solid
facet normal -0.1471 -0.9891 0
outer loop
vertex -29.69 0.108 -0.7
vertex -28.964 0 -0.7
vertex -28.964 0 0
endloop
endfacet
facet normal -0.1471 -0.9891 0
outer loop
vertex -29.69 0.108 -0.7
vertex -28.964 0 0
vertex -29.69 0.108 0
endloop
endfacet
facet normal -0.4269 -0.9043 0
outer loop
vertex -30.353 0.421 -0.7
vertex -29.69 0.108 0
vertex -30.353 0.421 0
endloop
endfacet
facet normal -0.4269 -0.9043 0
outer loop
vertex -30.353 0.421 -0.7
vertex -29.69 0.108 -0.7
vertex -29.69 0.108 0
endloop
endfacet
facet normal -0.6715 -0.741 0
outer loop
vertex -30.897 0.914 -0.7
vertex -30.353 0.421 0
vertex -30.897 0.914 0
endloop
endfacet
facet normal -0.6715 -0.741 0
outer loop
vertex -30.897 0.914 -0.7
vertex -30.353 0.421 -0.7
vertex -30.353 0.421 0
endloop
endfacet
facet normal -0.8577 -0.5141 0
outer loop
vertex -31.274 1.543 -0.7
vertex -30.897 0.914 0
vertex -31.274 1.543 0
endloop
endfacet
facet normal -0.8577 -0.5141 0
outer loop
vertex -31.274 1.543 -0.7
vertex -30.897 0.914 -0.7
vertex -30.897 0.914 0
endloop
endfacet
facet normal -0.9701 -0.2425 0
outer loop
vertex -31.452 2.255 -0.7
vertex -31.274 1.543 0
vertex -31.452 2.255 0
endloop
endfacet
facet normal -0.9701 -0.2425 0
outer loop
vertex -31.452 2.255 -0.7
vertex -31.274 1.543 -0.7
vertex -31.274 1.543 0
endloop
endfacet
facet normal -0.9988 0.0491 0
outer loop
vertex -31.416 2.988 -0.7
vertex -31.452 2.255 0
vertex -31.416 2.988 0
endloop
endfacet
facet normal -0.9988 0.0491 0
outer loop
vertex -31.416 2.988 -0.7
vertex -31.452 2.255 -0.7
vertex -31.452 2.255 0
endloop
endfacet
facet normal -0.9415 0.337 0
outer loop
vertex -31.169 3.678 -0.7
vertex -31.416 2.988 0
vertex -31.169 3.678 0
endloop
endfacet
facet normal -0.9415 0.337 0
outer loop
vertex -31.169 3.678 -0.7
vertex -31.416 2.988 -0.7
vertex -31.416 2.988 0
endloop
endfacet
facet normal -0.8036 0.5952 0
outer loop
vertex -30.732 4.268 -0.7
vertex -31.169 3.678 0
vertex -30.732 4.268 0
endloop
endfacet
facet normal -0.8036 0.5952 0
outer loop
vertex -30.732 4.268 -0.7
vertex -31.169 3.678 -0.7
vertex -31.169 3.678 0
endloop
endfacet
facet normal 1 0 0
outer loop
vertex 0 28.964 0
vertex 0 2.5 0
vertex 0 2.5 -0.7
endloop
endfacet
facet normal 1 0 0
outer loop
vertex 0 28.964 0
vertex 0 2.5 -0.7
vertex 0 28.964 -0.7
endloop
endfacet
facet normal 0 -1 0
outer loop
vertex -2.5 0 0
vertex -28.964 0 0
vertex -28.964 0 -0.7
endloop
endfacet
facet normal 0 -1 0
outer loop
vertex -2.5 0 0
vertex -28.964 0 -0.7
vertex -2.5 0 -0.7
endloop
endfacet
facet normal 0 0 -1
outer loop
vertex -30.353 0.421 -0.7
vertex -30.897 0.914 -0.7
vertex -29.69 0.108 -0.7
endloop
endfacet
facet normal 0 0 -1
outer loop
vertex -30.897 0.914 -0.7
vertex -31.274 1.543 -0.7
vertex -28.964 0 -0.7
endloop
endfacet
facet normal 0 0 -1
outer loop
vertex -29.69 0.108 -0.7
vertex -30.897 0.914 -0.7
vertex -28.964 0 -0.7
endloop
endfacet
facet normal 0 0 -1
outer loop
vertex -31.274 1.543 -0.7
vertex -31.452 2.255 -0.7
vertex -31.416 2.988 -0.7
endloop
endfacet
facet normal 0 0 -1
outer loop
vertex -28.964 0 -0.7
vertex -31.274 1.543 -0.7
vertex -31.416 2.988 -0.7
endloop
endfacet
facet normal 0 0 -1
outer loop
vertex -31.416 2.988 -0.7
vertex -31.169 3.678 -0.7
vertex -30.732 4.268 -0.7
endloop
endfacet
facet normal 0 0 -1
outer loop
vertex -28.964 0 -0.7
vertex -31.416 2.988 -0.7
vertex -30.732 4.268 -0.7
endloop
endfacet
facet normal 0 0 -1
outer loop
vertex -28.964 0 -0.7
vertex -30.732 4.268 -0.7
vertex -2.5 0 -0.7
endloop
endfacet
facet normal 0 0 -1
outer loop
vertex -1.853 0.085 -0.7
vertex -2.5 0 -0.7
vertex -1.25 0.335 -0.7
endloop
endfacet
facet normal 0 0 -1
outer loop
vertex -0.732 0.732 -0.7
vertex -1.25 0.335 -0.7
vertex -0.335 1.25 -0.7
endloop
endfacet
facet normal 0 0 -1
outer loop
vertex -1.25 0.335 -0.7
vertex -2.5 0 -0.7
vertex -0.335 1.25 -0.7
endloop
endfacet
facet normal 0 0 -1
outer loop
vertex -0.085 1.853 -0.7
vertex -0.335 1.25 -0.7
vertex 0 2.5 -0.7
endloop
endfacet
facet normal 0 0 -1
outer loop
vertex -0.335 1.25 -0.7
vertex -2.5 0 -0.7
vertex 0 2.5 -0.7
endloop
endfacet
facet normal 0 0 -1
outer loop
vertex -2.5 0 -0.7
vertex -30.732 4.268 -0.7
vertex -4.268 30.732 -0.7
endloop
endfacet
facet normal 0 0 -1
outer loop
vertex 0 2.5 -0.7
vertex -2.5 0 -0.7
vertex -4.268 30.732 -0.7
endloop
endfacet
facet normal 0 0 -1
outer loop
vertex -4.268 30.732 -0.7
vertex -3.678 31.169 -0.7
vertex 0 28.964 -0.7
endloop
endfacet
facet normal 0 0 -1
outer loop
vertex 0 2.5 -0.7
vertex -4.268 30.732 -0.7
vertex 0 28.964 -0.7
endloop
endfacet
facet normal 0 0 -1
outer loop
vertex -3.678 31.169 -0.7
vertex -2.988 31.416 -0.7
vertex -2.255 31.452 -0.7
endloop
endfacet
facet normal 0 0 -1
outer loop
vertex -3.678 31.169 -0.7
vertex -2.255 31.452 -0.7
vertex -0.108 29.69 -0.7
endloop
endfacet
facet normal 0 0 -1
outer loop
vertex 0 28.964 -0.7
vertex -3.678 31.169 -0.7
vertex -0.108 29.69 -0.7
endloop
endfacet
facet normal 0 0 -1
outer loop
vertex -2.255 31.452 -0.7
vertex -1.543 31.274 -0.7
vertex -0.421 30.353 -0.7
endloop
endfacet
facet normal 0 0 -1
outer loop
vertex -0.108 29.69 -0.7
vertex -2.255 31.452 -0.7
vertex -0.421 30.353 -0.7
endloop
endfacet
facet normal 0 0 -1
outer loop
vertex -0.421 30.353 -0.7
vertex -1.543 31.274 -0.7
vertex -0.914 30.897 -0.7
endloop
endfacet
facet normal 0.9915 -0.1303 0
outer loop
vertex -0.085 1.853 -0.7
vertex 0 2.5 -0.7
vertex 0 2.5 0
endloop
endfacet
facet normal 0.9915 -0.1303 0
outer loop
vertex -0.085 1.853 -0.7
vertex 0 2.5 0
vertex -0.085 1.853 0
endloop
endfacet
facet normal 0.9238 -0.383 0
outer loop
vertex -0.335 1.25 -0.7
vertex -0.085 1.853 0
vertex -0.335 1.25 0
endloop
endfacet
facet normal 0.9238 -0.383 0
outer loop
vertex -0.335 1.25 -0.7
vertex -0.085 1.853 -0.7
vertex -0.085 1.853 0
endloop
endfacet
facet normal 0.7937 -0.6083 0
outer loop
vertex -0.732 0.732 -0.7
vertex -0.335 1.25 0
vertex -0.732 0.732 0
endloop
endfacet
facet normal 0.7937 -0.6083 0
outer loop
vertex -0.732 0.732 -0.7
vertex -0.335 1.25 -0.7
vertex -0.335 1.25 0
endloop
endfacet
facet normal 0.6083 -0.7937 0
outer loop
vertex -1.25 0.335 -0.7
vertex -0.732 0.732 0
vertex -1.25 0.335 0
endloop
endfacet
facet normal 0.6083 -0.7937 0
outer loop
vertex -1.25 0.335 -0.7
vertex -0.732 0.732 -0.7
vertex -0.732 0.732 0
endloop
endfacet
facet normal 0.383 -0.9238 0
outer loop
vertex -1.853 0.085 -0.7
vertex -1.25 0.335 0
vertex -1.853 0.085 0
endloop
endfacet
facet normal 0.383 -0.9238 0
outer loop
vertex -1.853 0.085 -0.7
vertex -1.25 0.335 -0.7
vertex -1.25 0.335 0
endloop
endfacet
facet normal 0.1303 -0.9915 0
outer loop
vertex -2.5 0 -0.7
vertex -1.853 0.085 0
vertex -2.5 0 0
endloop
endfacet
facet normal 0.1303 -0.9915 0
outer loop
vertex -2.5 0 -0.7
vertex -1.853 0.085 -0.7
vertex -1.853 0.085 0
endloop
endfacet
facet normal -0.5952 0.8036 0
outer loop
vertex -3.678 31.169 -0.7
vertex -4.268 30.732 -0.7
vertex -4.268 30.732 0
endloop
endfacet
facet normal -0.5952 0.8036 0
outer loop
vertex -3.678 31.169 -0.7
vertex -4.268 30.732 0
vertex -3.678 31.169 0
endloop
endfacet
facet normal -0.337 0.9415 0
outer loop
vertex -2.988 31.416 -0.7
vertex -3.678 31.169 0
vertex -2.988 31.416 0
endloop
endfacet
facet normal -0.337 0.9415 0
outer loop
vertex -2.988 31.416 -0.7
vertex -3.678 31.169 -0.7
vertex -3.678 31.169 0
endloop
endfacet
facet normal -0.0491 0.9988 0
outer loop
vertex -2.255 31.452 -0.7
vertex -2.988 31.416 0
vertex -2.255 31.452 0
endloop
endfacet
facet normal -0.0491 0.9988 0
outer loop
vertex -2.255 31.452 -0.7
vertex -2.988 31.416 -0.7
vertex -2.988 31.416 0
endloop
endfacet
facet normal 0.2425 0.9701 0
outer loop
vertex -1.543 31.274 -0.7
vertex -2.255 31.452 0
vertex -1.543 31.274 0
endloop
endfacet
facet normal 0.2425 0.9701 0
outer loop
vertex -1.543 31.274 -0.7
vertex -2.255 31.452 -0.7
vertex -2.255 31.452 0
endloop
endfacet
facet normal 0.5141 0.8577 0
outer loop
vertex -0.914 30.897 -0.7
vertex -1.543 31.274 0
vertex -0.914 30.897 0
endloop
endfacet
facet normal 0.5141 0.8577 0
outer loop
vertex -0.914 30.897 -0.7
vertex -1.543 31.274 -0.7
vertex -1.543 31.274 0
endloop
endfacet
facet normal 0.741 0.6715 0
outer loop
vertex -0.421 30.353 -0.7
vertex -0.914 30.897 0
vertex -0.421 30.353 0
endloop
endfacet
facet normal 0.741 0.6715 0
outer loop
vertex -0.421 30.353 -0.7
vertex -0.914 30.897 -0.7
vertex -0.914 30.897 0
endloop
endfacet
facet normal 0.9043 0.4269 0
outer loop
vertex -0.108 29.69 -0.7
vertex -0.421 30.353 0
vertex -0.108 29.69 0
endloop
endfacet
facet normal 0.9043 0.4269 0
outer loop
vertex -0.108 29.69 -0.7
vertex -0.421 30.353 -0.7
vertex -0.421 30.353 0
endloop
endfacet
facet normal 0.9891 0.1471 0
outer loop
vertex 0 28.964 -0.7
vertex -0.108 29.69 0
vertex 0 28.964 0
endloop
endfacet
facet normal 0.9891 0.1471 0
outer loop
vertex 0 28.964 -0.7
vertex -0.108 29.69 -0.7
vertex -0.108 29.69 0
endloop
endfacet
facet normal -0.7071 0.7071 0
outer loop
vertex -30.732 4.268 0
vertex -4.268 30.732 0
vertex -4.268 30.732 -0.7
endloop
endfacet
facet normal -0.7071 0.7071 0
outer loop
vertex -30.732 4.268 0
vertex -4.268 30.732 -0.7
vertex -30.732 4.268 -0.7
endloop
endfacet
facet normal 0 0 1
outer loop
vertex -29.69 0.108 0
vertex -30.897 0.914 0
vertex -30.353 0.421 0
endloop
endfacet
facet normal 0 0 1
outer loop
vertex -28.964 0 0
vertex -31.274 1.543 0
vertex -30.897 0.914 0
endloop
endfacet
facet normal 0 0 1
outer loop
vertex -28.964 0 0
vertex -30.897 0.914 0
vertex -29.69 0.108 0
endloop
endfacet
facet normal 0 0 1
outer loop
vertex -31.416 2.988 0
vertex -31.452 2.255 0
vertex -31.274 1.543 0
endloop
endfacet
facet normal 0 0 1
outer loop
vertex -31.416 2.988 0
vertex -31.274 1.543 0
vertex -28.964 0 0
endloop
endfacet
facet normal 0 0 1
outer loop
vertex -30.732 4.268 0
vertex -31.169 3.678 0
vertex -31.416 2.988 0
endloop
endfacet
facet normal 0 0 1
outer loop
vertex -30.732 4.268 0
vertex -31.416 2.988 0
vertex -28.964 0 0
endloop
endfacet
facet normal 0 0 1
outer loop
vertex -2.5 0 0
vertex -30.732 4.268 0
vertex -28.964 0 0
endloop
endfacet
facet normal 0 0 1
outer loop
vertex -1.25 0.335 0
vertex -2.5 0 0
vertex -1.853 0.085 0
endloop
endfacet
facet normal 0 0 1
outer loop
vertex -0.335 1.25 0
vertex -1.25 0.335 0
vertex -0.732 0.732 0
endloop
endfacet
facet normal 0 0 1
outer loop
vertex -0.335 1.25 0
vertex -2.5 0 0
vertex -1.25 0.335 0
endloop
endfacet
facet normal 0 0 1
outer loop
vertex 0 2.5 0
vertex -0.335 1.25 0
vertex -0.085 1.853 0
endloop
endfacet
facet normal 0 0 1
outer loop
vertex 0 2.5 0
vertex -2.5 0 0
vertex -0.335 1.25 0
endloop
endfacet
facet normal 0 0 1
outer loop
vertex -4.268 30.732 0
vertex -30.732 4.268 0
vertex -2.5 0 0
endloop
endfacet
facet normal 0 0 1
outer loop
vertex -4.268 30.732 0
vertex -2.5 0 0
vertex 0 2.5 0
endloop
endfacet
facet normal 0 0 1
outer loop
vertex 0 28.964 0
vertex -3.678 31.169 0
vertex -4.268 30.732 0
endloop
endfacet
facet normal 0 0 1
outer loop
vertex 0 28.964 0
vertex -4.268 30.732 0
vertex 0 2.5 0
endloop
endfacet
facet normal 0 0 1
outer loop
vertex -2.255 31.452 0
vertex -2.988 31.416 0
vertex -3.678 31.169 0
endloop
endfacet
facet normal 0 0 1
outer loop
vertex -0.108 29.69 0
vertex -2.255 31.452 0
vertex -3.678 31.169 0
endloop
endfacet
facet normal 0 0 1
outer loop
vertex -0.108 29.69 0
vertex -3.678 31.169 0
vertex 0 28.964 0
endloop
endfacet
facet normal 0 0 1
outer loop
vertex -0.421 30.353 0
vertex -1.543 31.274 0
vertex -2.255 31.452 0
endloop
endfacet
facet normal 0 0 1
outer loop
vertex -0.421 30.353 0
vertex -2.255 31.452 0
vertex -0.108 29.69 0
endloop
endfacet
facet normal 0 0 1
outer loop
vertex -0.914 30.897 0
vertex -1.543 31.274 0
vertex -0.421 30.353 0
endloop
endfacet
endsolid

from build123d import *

# Parameters (mm, degrees)
BASE_FLANGE1_DEPTH  = 0.7
BREAK_CORNER1_START = -0.7
BREAK_CORNER1_DEPTH = 0.7


# Read off the part's stored shape, not the designer's step: Break-Corner1
# Sheet-metal steps are written as plain solids
with BuildPart() as part:
    # Sketch1 → Base-Flange1 (new body)
    with BuildSketch(Plane.XY):
        Polygon((0, 0), (0, 35), (-35, 0), align=None)
    extrude(amount=-BASE_FLANGE1_DEPTH)

    # Break-Corner1 outline → Break-Corner1 (cut)
    with BuildSketch(Plane.XY.offset(BREAK_CORNER1_START)):
        with BuildLine():
            ThreePointArc((-28.964466094, 0), (-31.274164925, 1.543291419), (-30.732233047, 4.267766953))
            Line((-30.732233047, 4.267766953), (-35, 0))
            Line((-35, 0), (-28.964466094, 0))
        make_face()
        with BuildLine():
            Line((0, 35), (-4.267766953, 30.732233047))
            ThreePointArc((-4.267766953, 30.732233047), (-1.543291419, 31.274164925), (0, 28.964466094))
            Line((0, 28.964466094), (0, 35))
        make_face()
        with BuildLine():
            ThreePointArc((0, 2.5), (-0.732233047, 0.732233047), (-2.5, 0))
            Line((-2.5, 0), (0, 0))
            Line((0, 0), (0, 2.5))
        make_face()
    extrude(amount=BREAK_CORNER1_DEPTH, mode=Mode.SUBTRACT)


solid = part.part
